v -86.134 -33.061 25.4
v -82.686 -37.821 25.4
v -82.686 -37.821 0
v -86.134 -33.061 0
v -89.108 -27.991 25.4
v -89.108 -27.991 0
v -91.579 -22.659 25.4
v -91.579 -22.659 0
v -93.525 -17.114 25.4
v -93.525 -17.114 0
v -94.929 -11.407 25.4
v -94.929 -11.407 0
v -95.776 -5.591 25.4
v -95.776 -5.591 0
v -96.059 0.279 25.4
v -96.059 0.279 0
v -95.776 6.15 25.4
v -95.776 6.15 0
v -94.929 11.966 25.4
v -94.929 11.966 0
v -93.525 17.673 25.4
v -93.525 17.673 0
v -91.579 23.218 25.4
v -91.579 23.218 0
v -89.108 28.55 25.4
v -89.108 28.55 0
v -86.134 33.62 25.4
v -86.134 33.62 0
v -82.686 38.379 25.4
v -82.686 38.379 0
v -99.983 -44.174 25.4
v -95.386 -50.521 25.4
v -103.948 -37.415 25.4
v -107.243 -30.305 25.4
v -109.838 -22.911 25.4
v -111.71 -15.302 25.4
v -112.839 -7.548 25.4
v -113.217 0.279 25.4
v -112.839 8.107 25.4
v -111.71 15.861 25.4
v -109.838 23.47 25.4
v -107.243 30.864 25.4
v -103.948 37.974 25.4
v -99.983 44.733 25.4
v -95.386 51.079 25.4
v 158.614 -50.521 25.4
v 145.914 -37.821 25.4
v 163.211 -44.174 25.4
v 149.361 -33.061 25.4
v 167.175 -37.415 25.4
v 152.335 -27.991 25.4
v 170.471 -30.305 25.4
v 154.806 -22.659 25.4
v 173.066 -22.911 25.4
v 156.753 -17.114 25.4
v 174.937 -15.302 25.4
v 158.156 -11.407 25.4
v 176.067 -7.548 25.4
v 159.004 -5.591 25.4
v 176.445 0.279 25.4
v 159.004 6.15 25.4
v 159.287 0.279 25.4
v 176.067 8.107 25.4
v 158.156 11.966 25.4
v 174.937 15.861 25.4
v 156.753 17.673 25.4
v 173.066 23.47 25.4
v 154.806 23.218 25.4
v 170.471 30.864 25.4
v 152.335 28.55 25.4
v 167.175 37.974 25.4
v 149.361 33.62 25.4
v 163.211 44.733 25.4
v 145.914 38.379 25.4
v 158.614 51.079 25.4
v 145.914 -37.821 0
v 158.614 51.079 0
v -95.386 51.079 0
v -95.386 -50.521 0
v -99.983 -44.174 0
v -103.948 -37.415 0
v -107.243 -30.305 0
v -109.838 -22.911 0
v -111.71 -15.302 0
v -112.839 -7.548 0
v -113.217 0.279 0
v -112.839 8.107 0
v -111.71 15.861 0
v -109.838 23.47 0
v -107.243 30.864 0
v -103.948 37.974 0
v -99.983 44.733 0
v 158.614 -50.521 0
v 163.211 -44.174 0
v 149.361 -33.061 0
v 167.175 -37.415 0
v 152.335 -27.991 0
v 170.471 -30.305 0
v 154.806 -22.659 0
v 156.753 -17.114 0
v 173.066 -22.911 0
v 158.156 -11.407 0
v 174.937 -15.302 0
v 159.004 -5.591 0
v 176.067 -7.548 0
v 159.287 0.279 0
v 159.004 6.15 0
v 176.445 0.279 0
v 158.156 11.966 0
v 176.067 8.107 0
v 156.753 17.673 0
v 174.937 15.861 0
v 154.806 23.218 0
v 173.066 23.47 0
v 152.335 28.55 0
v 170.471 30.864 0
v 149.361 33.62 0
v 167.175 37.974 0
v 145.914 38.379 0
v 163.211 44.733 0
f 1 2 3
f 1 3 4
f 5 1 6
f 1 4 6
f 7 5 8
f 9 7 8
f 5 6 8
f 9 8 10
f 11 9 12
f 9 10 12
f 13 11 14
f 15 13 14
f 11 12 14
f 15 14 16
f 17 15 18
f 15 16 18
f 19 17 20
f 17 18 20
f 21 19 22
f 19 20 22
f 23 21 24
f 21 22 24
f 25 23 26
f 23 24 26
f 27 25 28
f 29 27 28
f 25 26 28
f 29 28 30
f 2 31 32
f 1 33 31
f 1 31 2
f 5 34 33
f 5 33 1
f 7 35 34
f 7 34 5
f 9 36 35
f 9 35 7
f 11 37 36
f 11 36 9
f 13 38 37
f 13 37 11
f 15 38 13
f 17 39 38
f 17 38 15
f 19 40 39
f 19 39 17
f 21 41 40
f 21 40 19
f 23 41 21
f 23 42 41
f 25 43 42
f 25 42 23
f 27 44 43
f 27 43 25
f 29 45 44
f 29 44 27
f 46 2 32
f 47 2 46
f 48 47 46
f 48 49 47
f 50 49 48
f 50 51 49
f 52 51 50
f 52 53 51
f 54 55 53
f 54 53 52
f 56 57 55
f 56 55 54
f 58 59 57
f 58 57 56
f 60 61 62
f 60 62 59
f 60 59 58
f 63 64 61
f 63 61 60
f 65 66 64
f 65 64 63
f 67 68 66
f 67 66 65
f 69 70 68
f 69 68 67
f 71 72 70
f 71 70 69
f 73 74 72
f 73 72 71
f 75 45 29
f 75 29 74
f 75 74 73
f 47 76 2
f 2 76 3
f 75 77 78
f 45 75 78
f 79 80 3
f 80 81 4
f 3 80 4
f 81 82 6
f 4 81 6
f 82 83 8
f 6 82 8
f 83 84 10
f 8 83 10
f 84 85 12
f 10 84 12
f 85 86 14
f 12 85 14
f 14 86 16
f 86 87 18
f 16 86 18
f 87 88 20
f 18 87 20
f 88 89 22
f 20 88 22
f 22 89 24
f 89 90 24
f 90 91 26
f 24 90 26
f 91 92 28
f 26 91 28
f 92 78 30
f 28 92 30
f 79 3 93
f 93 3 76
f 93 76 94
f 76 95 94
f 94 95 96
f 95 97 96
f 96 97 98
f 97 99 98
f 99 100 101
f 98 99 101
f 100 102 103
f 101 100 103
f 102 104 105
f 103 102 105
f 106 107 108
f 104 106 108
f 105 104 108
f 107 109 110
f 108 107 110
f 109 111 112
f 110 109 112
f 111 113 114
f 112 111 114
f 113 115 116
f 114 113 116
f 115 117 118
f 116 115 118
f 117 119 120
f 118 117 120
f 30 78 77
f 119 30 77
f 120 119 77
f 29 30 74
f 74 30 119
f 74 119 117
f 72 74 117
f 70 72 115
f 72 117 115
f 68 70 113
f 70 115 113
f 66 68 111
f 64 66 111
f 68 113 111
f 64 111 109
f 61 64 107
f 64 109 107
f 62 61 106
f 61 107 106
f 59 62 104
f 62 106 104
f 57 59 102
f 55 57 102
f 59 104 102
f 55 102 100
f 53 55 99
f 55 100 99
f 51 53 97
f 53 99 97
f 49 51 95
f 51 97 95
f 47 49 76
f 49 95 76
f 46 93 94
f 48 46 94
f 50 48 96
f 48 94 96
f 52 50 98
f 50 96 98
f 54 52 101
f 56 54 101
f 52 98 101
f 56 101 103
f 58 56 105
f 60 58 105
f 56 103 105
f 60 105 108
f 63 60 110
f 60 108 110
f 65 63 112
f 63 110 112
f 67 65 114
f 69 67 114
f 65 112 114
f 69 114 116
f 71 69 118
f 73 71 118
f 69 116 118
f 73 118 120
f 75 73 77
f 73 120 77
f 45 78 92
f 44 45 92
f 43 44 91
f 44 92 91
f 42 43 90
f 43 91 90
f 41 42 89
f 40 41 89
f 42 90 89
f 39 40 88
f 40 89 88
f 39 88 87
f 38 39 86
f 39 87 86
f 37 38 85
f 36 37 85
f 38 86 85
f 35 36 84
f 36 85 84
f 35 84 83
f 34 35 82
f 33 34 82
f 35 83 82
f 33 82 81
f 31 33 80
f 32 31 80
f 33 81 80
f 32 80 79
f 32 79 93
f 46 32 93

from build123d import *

# Parameters (mm, degrees)
F1_DEPTH = 25.4


with BuildPart() as f1:
    # F0 (on Top) → F1 (new body)
    with BuildSketch(Plane.XY):
        with BuildLine():
            Line((158.613705, 51.07949), (-95.386295, 51.07949))
            ThreePointArc((-95.386295, 51.07949), (-113.217115, 0.27949), (-95.386295, -50.52051))
            Line((-95.386295, -50.52051), (31.613705, -50.52051))
            Line((31.613705, -50.52051), (158.613705, -50.52051))
            ThreePointArc((158.613705, -50.52051), (176.444525, 0.27949), (158.613705, 51.07949))
        make_face()
        with BuildLine():
            Line((145.913705, -37.82051), (31.613705, -37.82051))
            Line((31.613705, -37.82051), (-82.686295, -37.82051))
            ThreePointArc((-82.686295, -37.82051), (-96.05941, 0.27949), (-82.686295, 38.37949))
            Line((-82.686295, 38.37949), (31.613705, 38.37949))
            Line((31.613705, 38.37949), (145.913705, 38.37949))
            ThreePointArc((145.913705, 38.37949), (159.28682, 0.27949), (145.913705, -37.82051))
        make_face(mode=Mode.SUBTRACT)
    extrude(amount=F1_DEPTH)


solid = f1.part
